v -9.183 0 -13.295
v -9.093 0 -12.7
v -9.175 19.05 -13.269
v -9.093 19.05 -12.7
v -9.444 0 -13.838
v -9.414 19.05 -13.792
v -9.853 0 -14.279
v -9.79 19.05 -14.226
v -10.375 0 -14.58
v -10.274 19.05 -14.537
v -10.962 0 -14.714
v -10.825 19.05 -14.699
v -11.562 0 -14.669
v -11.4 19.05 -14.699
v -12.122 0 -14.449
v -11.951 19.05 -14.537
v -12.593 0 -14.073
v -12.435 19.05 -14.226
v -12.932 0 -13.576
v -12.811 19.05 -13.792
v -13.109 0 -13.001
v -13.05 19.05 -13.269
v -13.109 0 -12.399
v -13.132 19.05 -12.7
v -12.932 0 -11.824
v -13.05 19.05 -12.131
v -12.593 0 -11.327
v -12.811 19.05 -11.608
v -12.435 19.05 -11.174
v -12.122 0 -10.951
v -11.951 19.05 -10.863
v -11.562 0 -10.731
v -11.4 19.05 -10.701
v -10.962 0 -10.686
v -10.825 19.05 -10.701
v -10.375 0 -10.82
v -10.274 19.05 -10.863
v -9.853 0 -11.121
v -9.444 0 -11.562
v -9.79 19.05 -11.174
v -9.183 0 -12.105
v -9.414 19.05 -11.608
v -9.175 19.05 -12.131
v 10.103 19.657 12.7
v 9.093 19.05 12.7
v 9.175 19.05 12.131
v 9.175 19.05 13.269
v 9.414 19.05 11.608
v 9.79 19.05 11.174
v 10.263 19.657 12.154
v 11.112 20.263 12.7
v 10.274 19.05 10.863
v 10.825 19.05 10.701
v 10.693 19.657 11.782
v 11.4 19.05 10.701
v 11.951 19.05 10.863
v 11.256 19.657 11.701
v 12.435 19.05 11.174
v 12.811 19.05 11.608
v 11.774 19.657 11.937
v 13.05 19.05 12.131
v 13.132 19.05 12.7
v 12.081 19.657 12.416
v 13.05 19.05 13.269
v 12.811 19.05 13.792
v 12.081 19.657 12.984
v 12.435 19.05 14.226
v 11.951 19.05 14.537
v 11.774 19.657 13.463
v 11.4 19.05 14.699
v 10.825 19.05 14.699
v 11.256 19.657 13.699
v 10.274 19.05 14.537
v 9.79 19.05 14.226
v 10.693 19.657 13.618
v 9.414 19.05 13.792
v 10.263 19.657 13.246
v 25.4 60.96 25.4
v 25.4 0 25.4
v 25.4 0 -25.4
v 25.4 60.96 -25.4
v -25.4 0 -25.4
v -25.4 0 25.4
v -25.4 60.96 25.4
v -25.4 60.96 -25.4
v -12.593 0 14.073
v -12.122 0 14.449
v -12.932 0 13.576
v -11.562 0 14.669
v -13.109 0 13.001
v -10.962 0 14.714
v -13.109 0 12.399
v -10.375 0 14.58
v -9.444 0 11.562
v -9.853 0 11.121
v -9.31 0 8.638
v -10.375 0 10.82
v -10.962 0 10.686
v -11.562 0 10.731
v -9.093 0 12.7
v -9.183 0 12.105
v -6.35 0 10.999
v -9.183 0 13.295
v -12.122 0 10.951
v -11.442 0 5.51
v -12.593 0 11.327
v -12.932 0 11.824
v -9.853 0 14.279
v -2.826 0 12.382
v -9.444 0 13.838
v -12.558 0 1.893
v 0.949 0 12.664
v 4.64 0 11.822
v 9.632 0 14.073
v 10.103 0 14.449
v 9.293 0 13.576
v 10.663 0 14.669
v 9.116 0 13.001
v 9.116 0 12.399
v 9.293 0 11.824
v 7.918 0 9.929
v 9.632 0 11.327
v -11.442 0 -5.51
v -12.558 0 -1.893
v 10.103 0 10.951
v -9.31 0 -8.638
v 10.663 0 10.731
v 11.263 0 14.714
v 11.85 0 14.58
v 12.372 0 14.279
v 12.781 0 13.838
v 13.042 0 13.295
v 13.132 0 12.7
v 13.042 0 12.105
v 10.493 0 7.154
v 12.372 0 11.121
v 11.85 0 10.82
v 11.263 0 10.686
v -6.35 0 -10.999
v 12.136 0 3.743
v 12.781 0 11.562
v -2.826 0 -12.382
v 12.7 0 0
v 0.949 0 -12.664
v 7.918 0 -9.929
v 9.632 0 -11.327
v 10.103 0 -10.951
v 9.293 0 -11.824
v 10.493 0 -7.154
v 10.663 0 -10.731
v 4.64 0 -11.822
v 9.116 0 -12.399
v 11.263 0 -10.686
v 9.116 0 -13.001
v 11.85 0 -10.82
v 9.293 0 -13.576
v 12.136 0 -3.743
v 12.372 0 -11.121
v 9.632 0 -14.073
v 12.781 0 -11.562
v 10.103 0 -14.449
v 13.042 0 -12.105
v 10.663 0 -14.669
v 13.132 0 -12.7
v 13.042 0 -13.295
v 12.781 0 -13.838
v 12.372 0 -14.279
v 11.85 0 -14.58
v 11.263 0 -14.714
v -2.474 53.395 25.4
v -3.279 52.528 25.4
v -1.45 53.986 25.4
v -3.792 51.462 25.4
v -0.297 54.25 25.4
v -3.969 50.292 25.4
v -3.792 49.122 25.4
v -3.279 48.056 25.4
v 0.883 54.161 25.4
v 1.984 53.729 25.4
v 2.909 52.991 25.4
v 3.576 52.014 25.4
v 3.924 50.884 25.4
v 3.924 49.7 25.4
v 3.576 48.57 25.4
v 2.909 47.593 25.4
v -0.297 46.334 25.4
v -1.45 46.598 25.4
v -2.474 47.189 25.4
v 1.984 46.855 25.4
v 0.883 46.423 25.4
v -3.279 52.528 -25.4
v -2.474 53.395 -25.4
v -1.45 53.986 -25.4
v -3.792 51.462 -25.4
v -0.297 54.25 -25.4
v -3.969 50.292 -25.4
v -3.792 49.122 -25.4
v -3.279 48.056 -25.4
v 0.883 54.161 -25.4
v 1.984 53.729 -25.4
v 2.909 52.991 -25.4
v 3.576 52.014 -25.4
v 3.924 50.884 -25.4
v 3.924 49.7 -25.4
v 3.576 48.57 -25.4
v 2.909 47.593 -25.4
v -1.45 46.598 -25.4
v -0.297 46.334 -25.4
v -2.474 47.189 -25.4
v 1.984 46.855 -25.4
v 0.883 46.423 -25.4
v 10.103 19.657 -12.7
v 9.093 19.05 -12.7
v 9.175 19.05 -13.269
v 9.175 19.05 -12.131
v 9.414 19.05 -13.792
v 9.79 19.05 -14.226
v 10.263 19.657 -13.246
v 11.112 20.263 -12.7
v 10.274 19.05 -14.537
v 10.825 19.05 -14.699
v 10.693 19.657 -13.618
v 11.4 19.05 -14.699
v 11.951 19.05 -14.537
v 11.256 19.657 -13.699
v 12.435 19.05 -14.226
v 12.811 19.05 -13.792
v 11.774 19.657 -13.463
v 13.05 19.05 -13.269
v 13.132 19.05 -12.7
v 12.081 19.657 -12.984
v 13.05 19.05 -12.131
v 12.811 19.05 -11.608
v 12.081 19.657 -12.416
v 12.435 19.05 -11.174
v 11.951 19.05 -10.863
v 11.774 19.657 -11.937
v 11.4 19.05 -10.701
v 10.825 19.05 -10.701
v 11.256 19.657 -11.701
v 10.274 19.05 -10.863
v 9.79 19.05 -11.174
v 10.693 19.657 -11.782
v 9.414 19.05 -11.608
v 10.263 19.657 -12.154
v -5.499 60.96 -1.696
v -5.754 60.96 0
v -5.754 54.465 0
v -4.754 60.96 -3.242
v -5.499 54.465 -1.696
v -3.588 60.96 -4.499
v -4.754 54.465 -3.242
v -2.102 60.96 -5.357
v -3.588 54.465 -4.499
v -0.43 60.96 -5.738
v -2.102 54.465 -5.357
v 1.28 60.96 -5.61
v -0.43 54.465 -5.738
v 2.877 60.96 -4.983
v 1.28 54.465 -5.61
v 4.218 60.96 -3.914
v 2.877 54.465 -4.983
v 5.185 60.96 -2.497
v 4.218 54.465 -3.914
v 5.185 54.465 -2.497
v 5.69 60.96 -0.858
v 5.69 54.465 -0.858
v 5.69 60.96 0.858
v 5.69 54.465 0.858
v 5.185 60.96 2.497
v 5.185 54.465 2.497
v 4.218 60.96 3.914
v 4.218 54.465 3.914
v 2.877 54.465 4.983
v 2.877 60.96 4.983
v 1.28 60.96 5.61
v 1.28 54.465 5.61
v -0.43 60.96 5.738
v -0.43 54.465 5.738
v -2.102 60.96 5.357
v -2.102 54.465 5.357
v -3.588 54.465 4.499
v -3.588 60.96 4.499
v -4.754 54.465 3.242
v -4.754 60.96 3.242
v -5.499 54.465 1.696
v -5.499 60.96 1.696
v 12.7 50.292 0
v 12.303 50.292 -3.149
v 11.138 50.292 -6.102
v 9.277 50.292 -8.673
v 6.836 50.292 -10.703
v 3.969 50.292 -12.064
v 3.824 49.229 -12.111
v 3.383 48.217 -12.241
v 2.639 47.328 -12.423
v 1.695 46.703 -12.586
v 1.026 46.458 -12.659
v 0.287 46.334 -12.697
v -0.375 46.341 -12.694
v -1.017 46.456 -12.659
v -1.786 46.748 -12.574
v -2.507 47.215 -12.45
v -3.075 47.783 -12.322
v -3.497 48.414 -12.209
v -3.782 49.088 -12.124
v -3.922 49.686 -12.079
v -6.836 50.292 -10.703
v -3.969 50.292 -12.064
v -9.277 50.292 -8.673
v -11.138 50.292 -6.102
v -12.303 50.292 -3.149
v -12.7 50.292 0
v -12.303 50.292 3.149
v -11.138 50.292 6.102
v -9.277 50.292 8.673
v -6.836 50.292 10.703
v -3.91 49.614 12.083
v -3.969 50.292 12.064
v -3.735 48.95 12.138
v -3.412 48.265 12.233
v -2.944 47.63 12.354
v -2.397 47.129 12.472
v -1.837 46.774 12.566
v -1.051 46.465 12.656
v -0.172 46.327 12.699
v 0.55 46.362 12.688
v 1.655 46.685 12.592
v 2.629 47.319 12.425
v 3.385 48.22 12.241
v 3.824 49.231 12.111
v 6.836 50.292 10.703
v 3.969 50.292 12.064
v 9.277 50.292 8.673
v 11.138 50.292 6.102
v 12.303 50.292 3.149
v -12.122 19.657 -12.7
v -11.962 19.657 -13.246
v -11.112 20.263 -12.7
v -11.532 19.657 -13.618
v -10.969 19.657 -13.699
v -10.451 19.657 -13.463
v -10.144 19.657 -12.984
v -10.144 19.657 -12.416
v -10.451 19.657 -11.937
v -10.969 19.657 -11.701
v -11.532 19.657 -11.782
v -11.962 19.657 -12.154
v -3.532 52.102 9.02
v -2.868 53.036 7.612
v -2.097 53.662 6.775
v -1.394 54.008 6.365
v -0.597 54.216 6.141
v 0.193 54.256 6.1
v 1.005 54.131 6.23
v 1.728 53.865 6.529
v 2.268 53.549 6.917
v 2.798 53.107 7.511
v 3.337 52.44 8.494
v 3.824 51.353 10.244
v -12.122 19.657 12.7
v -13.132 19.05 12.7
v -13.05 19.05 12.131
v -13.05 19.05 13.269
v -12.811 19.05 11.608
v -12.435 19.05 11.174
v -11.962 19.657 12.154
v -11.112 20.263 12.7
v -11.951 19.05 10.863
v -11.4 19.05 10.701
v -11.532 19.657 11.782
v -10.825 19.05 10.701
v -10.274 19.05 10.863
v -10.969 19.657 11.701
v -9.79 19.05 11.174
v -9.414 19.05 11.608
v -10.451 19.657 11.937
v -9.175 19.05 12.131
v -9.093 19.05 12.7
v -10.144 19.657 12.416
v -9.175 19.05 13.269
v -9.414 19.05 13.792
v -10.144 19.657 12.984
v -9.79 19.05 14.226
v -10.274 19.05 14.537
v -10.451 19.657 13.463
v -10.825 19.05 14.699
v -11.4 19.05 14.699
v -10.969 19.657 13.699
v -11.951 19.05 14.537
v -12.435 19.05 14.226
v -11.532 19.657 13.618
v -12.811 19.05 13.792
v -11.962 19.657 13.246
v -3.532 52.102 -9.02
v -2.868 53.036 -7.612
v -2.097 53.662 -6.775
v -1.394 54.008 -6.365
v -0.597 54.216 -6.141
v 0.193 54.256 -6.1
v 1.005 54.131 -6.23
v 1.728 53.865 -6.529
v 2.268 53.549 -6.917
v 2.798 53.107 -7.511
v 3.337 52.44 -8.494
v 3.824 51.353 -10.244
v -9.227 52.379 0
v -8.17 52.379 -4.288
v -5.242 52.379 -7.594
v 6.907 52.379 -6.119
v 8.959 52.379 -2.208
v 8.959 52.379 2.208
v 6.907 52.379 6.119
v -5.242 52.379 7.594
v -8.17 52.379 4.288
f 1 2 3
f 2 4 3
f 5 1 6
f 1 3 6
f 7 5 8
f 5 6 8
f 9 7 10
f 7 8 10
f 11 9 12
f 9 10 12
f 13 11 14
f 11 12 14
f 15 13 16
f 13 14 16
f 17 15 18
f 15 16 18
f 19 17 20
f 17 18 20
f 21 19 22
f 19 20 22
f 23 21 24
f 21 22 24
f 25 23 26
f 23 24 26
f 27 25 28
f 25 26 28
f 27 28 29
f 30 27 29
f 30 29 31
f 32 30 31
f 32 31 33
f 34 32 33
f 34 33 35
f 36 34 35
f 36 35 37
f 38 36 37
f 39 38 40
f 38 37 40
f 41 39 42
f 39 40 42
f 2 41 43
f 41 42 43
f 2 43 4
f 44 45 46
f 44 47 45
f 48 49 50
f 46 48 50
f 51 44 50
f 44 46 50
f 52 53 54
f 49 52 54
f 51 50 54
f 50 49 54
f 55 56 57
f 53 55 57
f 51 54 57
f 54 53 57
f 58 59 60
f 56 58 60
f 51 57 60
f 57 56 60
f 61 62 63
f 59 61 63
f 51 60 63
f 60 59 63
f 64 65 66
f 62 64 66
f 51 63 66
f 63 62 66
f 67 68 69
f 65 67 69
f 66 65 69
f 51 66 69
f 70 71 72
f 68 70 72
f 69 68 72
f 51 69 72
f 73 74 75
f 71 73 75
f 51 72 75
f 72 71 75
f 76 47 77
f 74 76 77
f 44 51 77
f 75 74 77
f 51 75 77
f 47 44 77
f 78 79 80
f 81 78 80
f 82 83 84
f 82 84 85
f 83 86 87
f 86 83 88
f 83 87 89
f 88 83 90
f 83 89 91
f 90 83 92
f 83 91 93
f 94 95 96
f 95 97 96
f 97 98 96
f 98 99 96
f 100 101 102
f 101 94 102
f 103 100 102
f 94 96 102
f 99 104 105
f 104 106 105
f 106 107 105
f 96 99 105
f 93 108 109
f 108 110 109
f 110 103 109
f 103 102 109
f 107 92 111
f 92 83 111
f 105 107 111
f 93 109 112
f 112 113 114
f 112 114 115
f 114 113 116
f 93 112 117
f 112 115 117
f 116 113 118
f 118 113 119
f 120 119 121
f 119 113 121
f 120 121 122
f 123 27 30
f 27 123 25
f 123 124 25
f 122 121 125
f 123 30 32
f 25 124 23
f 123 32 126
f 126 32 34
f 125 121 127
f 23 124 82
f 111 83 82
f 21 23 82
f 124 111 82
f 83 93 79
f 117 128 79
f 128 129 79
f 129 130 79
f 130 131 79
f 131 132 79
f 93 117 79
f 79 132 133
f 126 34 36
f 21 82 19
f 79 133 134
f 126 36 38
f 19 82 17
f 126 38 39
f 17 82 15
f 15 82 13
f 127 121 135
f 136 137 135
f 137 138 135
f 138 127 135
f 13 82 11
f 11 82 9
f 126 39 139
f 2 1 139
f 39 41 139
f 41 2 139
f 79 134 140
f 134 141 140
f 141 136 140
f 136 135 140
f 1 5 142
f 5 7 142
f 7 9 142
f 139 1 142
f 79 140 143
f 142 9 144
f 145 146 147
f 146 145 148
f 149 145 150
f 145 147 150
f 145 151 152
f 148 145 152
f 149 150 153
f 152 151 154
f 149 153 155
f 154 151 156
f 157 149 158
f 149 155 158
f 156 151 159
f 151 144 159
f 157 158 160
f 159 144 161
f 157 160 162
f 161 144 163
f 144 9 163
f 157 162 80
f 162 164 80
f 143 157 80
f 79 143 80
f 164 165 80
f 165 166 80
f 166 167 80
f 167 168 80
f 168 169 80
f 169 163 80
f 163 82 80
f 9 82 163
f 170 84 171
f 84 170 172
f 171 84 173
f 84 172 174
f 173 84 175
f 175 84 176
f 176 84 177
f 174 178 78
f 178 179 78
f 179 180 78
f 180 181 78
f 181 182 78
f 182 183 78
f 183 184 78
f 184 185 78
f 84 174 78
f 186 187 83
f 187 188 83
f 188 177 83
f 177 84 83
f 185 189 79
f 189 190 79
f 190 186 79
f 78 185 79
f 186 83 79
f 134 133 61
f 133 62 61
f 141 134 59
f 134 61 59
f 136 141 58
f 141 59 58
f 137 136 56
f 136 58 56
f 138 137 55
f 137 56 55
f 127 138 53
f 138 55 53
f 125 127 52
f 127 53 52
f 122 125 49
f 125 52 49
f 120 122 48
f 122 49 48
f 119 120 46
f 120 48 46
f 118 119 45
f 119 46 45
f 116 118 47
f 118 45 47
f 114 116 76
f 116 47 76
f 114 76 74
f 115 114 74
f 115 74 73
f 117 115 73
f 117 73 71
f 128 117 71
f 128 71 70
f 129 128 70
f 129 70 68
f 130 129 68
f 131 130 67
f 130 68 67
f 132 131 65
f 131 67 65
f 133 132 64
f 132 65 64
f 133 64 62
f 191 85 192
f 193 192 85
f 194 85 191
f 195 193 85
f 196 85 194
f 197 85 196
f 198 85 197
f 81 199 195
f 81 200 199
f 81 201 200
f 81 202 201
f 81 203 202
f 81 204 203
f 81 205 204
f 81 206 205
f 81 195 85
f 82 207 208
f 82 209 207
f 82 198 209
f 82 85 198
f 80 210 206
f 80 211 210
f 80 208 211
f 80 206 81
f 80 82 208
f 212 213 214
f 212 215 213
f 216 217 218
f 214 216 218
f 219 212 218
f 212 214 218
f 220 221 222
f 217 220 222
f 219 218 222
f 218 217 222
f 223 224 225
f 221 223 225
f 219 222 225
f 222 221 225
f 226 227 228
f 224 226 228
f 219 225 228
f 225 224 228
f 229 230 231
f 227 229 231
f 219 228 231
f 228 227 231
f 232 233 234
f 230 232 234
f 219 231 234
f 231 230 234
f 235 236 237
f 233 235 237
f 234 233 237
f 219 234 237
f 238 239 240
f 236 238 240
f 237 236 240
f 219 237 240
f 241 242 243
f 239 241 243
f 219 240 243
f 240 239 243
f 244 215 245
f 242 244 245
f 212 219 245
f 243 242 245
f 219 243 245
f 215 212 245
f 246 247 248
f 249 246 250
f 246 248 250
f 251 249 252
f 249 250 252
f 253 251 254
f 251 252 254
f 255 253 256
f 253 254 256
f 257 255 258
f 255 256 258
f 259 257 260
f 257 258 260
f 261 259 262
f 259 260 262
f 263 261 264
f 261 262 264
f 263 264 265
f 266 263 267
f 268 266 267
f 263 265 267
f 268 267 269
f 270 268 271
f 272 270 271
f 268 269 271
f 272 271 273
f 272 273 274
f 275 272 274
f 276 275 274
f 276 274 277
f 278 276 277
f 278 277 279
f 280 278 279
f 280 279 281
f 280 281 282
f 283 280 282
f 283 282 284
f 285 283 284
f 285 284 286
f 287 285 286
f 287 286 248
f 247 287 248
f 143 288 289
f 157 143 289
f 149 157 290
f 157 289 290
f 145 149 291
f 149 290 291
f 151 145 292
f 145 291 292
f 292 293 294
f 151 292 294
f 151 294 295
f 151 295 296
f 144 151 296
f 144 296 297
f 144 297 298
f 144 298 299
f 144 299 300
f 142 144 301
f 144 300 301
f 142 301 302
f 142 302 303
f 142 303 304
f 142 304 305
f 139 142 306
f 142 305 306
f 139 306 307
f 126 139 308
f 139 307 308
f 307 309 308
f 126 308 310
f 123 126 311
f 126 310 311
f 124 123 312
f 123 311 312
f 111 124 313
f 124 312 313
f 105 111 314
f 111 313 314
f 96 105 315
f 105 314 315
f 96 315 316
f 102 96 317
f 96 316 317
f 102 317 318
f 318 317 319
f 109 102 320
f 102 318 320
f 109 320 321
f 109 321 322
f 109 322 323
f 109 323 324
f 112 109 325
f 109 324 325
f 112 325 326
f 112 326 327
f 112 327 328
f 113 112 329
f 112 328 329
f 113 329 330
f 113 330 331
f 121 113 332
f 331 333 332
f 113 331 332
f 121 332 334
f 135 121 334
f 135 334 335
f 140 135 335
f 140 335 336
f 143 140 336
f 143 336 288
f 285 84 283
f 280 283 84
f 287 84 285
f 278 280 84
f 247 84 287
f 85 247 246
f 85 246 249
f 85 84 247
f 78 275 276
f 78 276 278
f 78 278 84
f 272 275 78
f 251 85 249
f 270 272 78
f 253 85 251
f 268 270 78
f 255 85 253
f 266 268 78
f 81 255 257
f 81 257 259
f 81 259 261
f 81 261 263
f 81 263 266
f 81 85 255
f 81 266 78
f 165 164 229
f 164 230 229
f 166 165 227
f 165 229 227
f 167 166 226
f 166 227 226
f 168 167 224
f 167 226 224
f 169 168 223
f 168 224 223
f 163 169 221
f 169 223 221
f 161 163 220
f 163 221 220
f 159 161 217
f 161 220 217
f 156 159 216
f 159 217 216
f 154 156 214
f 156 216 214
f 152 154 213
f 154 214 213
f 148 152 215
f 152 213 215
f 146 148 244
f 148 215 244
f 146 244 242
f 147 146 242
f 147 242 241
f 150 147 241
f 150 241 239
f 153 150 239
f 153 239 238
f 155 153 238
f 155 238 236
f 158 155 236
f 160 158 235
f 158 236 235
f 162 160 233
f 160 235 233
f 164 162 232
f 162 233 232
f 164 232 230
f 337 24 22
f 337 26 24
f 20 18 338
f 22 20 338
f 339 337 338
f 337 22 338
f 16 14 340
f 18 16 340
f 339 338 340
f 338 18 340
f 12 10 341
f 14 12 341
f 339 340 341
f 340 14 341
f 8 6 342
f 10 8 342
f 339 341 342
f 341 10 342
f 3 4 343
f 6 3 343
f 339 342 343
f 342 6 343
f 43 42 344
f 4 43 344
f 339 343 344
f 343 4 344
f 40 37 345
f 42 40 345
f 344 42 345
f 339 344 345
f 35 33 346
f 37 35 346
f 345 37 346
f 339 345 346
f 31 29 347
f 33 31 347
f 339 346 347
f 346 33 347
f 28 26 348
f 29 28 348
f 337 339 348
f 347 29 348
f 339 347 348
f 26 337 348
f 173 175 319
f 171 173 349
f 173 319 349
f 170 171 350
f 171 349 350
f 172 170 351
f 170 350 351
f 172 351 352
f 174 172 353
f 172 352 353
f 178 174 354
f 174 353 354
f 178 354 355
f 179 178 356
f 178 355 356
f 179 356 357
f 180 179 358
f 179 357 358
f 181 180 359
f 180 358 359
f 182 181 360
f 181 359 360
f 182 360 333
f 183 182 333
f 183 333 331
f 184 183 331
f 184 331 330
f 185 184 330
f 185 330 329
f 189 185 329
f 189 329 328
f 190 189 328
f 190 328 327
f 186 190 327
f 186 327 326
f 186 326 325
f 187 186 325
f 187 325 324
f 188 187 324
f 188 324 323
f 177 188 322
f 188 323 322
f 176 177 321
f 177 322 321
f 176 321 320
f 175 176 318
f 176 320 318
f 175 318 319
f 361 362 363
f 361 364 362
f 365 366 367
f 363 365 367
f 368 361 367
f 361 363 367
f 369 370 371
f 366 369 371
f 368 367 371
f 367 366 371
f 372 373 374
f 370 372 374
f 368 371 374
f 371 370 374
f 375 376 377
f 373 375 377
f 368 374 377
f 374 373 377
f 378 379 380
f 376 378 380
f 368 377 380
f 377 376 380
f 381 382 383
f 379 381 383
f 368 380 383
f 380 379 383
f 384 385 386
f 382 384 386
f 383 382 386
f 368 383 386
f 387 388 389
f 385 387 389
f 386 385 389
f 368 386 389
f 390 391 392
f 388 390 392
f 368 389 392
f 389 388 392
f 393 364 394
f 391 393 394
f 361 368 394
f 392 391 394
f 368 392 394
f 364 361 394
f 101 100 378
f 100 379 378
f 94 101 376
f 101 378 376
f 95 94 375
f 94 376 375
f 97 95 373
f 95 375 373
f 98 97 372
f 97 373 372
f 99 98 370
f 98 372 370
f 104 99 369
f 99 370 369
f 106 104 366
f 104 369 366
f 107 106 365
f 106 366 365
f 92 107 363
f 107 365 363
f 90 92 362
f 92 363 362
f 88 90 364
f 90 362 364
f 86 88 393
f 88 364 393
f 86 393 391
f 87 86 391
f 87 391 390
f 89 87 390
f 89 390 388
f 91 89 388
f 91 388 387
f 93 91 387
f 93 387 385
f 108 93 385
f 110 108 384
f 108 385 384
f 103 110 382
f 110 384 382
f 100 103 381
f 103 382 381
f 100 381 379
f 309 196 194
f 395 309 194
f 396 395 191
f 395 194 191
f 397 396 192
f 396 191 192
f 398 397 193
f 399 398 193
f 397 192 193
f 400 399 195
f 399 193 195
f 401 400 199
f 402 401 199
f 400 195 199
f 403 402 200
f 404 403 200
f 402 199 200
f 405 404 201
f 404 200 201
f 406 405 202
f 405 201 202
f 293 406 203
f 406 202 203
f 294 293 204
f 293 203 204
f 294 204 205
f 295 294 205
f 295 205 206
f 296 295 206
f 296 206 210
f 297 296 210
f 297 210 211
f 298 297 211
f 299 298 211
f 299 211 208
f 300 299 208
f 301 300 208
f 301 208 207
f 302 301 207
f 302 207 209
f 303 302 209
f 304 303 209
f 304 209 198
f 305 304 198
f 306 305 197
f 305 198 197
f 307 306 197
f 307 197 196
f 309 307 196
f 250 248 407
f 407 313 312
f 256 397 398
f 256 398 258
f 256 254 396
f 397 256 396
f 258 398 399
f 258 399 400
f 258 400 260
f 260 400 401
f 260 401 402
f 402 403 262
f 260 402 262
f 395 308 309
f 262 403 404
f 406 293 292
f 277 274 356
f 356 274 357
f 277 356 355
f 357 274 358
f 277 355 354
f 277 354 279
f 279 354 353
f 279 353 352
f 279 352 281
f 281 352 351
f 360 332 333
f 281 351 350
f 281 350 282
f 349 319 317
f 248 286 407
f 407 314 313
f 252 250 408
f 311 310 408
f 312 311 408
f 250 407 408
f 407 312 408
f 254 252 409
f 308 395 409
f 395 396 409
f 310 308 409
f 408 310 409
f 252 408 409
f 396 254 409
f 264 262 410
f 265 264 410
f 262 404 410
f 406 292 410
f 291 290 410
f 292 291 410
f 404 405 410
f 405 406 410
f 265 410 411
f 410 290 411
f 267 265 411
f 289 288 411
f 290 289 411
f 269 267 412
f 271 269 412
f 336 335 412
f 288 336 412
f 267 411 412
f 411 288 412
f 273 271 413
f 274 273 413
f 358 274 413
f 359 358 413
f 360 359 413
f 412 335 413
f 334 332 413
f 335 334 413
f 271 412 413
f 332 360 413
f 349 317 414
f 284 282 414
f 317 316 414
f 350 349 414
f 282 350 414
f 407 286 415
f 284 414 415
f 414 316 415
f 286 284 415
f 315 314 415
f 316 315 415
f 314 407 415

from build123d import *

# Parameters (mm, degrees)
SKETCH1_W                  = 50.8
SKETCH1_H                  = 50.8
BLOCK_DEPTH                = 60.96
SPRING_BORE_D              = 25.4
SPRING_BORE_DEPTH          = 50.292
SPRING_BORE_TIP            = 7.630929862
F_1_2_20_TAPPED_HOLE_D     = 11.50874
F_10_32_TAPPED_HOLES_D     = 4.0386
F_10_32_TAPPED_HOLES_DEPTH = 19.05
F_10_32_TAPPED_HOLES_TIP   = 1.213317848
VIEW_HOLE_D                = 7.9375


with BuildPart() as part:
    # Sketch1 → Block (new body)
    with BuildSketch(Plane(origin=(0, 0, 0), x_dir=(1, 0, 0), z_dir=(0, 1, 0))):
        Rectangle(SKETCH1_W, SKETCH1_H)
    extrude(amount=BLOCK_DEPTH)

    # Spring Bore
    with Locations(Plane(origin=(0, 0, 0), x_dir=(-1, 0, 0), z_dir=(0, -1, 0))):
        with Locations((0, 0)):
            Hole(SPRING_BORE_D / 2, depth=SPRING_BORE_DEPTH)
            with Locations((0, 0, -(SPRING_BORE_DEPTH + SPRING_BORE_TIP / 2))):  # 118° drill point
                Cone(0, SPRING_BORE_D / 2, SPRING_BORE_TIP, mode=Mode.SUBTRACT)

    # 1/2-20 Tapped Hole (through all)
    with Locations(Plane(origin=(0, 60.96, 0), x_dir=(1, 0, 0), z_dir=(0, 1, 0))):
        with Locations((0, 0)):
            Hole(F_1_2_20_TAPPED_HOLE_D / 2)

    # #10-32 Tapped Holes
    with Locations(Plane(origin=(0, 0, 0), x_dir=(-1, 0, 0), z_dir=(0, -1, 0))):
        with Locations((11.1125, 12.7), (11.1125, -12.7), (-11.1125, -12.7), (-11.1125, 12.7), (0, 0)):
            Hole(F_10_32_TAPPED_HOLES_D / 2, depth=F_10_32_TAPPED_HOLES_DEPTH)
            with Locations((0, 0, -(F_10_32_TAPPED_HOLES_DEPTH + F_10_32_TAPPED_HOLES_TIP / 2))):  # 118° drill point
                Cone(0, F_10_32_TAPPED_HOLES_D / 2, F_10_32_TAPPED_HOLES_TIP, mode=Mode.SUBTRACT)

    # View Hole (through all)
    with Locations(Plane.XY.offset(25.4)):
        with Locations((0, 50.292)):
            Hole(VIEW_HOLE_D / 2)


solid = part.part
